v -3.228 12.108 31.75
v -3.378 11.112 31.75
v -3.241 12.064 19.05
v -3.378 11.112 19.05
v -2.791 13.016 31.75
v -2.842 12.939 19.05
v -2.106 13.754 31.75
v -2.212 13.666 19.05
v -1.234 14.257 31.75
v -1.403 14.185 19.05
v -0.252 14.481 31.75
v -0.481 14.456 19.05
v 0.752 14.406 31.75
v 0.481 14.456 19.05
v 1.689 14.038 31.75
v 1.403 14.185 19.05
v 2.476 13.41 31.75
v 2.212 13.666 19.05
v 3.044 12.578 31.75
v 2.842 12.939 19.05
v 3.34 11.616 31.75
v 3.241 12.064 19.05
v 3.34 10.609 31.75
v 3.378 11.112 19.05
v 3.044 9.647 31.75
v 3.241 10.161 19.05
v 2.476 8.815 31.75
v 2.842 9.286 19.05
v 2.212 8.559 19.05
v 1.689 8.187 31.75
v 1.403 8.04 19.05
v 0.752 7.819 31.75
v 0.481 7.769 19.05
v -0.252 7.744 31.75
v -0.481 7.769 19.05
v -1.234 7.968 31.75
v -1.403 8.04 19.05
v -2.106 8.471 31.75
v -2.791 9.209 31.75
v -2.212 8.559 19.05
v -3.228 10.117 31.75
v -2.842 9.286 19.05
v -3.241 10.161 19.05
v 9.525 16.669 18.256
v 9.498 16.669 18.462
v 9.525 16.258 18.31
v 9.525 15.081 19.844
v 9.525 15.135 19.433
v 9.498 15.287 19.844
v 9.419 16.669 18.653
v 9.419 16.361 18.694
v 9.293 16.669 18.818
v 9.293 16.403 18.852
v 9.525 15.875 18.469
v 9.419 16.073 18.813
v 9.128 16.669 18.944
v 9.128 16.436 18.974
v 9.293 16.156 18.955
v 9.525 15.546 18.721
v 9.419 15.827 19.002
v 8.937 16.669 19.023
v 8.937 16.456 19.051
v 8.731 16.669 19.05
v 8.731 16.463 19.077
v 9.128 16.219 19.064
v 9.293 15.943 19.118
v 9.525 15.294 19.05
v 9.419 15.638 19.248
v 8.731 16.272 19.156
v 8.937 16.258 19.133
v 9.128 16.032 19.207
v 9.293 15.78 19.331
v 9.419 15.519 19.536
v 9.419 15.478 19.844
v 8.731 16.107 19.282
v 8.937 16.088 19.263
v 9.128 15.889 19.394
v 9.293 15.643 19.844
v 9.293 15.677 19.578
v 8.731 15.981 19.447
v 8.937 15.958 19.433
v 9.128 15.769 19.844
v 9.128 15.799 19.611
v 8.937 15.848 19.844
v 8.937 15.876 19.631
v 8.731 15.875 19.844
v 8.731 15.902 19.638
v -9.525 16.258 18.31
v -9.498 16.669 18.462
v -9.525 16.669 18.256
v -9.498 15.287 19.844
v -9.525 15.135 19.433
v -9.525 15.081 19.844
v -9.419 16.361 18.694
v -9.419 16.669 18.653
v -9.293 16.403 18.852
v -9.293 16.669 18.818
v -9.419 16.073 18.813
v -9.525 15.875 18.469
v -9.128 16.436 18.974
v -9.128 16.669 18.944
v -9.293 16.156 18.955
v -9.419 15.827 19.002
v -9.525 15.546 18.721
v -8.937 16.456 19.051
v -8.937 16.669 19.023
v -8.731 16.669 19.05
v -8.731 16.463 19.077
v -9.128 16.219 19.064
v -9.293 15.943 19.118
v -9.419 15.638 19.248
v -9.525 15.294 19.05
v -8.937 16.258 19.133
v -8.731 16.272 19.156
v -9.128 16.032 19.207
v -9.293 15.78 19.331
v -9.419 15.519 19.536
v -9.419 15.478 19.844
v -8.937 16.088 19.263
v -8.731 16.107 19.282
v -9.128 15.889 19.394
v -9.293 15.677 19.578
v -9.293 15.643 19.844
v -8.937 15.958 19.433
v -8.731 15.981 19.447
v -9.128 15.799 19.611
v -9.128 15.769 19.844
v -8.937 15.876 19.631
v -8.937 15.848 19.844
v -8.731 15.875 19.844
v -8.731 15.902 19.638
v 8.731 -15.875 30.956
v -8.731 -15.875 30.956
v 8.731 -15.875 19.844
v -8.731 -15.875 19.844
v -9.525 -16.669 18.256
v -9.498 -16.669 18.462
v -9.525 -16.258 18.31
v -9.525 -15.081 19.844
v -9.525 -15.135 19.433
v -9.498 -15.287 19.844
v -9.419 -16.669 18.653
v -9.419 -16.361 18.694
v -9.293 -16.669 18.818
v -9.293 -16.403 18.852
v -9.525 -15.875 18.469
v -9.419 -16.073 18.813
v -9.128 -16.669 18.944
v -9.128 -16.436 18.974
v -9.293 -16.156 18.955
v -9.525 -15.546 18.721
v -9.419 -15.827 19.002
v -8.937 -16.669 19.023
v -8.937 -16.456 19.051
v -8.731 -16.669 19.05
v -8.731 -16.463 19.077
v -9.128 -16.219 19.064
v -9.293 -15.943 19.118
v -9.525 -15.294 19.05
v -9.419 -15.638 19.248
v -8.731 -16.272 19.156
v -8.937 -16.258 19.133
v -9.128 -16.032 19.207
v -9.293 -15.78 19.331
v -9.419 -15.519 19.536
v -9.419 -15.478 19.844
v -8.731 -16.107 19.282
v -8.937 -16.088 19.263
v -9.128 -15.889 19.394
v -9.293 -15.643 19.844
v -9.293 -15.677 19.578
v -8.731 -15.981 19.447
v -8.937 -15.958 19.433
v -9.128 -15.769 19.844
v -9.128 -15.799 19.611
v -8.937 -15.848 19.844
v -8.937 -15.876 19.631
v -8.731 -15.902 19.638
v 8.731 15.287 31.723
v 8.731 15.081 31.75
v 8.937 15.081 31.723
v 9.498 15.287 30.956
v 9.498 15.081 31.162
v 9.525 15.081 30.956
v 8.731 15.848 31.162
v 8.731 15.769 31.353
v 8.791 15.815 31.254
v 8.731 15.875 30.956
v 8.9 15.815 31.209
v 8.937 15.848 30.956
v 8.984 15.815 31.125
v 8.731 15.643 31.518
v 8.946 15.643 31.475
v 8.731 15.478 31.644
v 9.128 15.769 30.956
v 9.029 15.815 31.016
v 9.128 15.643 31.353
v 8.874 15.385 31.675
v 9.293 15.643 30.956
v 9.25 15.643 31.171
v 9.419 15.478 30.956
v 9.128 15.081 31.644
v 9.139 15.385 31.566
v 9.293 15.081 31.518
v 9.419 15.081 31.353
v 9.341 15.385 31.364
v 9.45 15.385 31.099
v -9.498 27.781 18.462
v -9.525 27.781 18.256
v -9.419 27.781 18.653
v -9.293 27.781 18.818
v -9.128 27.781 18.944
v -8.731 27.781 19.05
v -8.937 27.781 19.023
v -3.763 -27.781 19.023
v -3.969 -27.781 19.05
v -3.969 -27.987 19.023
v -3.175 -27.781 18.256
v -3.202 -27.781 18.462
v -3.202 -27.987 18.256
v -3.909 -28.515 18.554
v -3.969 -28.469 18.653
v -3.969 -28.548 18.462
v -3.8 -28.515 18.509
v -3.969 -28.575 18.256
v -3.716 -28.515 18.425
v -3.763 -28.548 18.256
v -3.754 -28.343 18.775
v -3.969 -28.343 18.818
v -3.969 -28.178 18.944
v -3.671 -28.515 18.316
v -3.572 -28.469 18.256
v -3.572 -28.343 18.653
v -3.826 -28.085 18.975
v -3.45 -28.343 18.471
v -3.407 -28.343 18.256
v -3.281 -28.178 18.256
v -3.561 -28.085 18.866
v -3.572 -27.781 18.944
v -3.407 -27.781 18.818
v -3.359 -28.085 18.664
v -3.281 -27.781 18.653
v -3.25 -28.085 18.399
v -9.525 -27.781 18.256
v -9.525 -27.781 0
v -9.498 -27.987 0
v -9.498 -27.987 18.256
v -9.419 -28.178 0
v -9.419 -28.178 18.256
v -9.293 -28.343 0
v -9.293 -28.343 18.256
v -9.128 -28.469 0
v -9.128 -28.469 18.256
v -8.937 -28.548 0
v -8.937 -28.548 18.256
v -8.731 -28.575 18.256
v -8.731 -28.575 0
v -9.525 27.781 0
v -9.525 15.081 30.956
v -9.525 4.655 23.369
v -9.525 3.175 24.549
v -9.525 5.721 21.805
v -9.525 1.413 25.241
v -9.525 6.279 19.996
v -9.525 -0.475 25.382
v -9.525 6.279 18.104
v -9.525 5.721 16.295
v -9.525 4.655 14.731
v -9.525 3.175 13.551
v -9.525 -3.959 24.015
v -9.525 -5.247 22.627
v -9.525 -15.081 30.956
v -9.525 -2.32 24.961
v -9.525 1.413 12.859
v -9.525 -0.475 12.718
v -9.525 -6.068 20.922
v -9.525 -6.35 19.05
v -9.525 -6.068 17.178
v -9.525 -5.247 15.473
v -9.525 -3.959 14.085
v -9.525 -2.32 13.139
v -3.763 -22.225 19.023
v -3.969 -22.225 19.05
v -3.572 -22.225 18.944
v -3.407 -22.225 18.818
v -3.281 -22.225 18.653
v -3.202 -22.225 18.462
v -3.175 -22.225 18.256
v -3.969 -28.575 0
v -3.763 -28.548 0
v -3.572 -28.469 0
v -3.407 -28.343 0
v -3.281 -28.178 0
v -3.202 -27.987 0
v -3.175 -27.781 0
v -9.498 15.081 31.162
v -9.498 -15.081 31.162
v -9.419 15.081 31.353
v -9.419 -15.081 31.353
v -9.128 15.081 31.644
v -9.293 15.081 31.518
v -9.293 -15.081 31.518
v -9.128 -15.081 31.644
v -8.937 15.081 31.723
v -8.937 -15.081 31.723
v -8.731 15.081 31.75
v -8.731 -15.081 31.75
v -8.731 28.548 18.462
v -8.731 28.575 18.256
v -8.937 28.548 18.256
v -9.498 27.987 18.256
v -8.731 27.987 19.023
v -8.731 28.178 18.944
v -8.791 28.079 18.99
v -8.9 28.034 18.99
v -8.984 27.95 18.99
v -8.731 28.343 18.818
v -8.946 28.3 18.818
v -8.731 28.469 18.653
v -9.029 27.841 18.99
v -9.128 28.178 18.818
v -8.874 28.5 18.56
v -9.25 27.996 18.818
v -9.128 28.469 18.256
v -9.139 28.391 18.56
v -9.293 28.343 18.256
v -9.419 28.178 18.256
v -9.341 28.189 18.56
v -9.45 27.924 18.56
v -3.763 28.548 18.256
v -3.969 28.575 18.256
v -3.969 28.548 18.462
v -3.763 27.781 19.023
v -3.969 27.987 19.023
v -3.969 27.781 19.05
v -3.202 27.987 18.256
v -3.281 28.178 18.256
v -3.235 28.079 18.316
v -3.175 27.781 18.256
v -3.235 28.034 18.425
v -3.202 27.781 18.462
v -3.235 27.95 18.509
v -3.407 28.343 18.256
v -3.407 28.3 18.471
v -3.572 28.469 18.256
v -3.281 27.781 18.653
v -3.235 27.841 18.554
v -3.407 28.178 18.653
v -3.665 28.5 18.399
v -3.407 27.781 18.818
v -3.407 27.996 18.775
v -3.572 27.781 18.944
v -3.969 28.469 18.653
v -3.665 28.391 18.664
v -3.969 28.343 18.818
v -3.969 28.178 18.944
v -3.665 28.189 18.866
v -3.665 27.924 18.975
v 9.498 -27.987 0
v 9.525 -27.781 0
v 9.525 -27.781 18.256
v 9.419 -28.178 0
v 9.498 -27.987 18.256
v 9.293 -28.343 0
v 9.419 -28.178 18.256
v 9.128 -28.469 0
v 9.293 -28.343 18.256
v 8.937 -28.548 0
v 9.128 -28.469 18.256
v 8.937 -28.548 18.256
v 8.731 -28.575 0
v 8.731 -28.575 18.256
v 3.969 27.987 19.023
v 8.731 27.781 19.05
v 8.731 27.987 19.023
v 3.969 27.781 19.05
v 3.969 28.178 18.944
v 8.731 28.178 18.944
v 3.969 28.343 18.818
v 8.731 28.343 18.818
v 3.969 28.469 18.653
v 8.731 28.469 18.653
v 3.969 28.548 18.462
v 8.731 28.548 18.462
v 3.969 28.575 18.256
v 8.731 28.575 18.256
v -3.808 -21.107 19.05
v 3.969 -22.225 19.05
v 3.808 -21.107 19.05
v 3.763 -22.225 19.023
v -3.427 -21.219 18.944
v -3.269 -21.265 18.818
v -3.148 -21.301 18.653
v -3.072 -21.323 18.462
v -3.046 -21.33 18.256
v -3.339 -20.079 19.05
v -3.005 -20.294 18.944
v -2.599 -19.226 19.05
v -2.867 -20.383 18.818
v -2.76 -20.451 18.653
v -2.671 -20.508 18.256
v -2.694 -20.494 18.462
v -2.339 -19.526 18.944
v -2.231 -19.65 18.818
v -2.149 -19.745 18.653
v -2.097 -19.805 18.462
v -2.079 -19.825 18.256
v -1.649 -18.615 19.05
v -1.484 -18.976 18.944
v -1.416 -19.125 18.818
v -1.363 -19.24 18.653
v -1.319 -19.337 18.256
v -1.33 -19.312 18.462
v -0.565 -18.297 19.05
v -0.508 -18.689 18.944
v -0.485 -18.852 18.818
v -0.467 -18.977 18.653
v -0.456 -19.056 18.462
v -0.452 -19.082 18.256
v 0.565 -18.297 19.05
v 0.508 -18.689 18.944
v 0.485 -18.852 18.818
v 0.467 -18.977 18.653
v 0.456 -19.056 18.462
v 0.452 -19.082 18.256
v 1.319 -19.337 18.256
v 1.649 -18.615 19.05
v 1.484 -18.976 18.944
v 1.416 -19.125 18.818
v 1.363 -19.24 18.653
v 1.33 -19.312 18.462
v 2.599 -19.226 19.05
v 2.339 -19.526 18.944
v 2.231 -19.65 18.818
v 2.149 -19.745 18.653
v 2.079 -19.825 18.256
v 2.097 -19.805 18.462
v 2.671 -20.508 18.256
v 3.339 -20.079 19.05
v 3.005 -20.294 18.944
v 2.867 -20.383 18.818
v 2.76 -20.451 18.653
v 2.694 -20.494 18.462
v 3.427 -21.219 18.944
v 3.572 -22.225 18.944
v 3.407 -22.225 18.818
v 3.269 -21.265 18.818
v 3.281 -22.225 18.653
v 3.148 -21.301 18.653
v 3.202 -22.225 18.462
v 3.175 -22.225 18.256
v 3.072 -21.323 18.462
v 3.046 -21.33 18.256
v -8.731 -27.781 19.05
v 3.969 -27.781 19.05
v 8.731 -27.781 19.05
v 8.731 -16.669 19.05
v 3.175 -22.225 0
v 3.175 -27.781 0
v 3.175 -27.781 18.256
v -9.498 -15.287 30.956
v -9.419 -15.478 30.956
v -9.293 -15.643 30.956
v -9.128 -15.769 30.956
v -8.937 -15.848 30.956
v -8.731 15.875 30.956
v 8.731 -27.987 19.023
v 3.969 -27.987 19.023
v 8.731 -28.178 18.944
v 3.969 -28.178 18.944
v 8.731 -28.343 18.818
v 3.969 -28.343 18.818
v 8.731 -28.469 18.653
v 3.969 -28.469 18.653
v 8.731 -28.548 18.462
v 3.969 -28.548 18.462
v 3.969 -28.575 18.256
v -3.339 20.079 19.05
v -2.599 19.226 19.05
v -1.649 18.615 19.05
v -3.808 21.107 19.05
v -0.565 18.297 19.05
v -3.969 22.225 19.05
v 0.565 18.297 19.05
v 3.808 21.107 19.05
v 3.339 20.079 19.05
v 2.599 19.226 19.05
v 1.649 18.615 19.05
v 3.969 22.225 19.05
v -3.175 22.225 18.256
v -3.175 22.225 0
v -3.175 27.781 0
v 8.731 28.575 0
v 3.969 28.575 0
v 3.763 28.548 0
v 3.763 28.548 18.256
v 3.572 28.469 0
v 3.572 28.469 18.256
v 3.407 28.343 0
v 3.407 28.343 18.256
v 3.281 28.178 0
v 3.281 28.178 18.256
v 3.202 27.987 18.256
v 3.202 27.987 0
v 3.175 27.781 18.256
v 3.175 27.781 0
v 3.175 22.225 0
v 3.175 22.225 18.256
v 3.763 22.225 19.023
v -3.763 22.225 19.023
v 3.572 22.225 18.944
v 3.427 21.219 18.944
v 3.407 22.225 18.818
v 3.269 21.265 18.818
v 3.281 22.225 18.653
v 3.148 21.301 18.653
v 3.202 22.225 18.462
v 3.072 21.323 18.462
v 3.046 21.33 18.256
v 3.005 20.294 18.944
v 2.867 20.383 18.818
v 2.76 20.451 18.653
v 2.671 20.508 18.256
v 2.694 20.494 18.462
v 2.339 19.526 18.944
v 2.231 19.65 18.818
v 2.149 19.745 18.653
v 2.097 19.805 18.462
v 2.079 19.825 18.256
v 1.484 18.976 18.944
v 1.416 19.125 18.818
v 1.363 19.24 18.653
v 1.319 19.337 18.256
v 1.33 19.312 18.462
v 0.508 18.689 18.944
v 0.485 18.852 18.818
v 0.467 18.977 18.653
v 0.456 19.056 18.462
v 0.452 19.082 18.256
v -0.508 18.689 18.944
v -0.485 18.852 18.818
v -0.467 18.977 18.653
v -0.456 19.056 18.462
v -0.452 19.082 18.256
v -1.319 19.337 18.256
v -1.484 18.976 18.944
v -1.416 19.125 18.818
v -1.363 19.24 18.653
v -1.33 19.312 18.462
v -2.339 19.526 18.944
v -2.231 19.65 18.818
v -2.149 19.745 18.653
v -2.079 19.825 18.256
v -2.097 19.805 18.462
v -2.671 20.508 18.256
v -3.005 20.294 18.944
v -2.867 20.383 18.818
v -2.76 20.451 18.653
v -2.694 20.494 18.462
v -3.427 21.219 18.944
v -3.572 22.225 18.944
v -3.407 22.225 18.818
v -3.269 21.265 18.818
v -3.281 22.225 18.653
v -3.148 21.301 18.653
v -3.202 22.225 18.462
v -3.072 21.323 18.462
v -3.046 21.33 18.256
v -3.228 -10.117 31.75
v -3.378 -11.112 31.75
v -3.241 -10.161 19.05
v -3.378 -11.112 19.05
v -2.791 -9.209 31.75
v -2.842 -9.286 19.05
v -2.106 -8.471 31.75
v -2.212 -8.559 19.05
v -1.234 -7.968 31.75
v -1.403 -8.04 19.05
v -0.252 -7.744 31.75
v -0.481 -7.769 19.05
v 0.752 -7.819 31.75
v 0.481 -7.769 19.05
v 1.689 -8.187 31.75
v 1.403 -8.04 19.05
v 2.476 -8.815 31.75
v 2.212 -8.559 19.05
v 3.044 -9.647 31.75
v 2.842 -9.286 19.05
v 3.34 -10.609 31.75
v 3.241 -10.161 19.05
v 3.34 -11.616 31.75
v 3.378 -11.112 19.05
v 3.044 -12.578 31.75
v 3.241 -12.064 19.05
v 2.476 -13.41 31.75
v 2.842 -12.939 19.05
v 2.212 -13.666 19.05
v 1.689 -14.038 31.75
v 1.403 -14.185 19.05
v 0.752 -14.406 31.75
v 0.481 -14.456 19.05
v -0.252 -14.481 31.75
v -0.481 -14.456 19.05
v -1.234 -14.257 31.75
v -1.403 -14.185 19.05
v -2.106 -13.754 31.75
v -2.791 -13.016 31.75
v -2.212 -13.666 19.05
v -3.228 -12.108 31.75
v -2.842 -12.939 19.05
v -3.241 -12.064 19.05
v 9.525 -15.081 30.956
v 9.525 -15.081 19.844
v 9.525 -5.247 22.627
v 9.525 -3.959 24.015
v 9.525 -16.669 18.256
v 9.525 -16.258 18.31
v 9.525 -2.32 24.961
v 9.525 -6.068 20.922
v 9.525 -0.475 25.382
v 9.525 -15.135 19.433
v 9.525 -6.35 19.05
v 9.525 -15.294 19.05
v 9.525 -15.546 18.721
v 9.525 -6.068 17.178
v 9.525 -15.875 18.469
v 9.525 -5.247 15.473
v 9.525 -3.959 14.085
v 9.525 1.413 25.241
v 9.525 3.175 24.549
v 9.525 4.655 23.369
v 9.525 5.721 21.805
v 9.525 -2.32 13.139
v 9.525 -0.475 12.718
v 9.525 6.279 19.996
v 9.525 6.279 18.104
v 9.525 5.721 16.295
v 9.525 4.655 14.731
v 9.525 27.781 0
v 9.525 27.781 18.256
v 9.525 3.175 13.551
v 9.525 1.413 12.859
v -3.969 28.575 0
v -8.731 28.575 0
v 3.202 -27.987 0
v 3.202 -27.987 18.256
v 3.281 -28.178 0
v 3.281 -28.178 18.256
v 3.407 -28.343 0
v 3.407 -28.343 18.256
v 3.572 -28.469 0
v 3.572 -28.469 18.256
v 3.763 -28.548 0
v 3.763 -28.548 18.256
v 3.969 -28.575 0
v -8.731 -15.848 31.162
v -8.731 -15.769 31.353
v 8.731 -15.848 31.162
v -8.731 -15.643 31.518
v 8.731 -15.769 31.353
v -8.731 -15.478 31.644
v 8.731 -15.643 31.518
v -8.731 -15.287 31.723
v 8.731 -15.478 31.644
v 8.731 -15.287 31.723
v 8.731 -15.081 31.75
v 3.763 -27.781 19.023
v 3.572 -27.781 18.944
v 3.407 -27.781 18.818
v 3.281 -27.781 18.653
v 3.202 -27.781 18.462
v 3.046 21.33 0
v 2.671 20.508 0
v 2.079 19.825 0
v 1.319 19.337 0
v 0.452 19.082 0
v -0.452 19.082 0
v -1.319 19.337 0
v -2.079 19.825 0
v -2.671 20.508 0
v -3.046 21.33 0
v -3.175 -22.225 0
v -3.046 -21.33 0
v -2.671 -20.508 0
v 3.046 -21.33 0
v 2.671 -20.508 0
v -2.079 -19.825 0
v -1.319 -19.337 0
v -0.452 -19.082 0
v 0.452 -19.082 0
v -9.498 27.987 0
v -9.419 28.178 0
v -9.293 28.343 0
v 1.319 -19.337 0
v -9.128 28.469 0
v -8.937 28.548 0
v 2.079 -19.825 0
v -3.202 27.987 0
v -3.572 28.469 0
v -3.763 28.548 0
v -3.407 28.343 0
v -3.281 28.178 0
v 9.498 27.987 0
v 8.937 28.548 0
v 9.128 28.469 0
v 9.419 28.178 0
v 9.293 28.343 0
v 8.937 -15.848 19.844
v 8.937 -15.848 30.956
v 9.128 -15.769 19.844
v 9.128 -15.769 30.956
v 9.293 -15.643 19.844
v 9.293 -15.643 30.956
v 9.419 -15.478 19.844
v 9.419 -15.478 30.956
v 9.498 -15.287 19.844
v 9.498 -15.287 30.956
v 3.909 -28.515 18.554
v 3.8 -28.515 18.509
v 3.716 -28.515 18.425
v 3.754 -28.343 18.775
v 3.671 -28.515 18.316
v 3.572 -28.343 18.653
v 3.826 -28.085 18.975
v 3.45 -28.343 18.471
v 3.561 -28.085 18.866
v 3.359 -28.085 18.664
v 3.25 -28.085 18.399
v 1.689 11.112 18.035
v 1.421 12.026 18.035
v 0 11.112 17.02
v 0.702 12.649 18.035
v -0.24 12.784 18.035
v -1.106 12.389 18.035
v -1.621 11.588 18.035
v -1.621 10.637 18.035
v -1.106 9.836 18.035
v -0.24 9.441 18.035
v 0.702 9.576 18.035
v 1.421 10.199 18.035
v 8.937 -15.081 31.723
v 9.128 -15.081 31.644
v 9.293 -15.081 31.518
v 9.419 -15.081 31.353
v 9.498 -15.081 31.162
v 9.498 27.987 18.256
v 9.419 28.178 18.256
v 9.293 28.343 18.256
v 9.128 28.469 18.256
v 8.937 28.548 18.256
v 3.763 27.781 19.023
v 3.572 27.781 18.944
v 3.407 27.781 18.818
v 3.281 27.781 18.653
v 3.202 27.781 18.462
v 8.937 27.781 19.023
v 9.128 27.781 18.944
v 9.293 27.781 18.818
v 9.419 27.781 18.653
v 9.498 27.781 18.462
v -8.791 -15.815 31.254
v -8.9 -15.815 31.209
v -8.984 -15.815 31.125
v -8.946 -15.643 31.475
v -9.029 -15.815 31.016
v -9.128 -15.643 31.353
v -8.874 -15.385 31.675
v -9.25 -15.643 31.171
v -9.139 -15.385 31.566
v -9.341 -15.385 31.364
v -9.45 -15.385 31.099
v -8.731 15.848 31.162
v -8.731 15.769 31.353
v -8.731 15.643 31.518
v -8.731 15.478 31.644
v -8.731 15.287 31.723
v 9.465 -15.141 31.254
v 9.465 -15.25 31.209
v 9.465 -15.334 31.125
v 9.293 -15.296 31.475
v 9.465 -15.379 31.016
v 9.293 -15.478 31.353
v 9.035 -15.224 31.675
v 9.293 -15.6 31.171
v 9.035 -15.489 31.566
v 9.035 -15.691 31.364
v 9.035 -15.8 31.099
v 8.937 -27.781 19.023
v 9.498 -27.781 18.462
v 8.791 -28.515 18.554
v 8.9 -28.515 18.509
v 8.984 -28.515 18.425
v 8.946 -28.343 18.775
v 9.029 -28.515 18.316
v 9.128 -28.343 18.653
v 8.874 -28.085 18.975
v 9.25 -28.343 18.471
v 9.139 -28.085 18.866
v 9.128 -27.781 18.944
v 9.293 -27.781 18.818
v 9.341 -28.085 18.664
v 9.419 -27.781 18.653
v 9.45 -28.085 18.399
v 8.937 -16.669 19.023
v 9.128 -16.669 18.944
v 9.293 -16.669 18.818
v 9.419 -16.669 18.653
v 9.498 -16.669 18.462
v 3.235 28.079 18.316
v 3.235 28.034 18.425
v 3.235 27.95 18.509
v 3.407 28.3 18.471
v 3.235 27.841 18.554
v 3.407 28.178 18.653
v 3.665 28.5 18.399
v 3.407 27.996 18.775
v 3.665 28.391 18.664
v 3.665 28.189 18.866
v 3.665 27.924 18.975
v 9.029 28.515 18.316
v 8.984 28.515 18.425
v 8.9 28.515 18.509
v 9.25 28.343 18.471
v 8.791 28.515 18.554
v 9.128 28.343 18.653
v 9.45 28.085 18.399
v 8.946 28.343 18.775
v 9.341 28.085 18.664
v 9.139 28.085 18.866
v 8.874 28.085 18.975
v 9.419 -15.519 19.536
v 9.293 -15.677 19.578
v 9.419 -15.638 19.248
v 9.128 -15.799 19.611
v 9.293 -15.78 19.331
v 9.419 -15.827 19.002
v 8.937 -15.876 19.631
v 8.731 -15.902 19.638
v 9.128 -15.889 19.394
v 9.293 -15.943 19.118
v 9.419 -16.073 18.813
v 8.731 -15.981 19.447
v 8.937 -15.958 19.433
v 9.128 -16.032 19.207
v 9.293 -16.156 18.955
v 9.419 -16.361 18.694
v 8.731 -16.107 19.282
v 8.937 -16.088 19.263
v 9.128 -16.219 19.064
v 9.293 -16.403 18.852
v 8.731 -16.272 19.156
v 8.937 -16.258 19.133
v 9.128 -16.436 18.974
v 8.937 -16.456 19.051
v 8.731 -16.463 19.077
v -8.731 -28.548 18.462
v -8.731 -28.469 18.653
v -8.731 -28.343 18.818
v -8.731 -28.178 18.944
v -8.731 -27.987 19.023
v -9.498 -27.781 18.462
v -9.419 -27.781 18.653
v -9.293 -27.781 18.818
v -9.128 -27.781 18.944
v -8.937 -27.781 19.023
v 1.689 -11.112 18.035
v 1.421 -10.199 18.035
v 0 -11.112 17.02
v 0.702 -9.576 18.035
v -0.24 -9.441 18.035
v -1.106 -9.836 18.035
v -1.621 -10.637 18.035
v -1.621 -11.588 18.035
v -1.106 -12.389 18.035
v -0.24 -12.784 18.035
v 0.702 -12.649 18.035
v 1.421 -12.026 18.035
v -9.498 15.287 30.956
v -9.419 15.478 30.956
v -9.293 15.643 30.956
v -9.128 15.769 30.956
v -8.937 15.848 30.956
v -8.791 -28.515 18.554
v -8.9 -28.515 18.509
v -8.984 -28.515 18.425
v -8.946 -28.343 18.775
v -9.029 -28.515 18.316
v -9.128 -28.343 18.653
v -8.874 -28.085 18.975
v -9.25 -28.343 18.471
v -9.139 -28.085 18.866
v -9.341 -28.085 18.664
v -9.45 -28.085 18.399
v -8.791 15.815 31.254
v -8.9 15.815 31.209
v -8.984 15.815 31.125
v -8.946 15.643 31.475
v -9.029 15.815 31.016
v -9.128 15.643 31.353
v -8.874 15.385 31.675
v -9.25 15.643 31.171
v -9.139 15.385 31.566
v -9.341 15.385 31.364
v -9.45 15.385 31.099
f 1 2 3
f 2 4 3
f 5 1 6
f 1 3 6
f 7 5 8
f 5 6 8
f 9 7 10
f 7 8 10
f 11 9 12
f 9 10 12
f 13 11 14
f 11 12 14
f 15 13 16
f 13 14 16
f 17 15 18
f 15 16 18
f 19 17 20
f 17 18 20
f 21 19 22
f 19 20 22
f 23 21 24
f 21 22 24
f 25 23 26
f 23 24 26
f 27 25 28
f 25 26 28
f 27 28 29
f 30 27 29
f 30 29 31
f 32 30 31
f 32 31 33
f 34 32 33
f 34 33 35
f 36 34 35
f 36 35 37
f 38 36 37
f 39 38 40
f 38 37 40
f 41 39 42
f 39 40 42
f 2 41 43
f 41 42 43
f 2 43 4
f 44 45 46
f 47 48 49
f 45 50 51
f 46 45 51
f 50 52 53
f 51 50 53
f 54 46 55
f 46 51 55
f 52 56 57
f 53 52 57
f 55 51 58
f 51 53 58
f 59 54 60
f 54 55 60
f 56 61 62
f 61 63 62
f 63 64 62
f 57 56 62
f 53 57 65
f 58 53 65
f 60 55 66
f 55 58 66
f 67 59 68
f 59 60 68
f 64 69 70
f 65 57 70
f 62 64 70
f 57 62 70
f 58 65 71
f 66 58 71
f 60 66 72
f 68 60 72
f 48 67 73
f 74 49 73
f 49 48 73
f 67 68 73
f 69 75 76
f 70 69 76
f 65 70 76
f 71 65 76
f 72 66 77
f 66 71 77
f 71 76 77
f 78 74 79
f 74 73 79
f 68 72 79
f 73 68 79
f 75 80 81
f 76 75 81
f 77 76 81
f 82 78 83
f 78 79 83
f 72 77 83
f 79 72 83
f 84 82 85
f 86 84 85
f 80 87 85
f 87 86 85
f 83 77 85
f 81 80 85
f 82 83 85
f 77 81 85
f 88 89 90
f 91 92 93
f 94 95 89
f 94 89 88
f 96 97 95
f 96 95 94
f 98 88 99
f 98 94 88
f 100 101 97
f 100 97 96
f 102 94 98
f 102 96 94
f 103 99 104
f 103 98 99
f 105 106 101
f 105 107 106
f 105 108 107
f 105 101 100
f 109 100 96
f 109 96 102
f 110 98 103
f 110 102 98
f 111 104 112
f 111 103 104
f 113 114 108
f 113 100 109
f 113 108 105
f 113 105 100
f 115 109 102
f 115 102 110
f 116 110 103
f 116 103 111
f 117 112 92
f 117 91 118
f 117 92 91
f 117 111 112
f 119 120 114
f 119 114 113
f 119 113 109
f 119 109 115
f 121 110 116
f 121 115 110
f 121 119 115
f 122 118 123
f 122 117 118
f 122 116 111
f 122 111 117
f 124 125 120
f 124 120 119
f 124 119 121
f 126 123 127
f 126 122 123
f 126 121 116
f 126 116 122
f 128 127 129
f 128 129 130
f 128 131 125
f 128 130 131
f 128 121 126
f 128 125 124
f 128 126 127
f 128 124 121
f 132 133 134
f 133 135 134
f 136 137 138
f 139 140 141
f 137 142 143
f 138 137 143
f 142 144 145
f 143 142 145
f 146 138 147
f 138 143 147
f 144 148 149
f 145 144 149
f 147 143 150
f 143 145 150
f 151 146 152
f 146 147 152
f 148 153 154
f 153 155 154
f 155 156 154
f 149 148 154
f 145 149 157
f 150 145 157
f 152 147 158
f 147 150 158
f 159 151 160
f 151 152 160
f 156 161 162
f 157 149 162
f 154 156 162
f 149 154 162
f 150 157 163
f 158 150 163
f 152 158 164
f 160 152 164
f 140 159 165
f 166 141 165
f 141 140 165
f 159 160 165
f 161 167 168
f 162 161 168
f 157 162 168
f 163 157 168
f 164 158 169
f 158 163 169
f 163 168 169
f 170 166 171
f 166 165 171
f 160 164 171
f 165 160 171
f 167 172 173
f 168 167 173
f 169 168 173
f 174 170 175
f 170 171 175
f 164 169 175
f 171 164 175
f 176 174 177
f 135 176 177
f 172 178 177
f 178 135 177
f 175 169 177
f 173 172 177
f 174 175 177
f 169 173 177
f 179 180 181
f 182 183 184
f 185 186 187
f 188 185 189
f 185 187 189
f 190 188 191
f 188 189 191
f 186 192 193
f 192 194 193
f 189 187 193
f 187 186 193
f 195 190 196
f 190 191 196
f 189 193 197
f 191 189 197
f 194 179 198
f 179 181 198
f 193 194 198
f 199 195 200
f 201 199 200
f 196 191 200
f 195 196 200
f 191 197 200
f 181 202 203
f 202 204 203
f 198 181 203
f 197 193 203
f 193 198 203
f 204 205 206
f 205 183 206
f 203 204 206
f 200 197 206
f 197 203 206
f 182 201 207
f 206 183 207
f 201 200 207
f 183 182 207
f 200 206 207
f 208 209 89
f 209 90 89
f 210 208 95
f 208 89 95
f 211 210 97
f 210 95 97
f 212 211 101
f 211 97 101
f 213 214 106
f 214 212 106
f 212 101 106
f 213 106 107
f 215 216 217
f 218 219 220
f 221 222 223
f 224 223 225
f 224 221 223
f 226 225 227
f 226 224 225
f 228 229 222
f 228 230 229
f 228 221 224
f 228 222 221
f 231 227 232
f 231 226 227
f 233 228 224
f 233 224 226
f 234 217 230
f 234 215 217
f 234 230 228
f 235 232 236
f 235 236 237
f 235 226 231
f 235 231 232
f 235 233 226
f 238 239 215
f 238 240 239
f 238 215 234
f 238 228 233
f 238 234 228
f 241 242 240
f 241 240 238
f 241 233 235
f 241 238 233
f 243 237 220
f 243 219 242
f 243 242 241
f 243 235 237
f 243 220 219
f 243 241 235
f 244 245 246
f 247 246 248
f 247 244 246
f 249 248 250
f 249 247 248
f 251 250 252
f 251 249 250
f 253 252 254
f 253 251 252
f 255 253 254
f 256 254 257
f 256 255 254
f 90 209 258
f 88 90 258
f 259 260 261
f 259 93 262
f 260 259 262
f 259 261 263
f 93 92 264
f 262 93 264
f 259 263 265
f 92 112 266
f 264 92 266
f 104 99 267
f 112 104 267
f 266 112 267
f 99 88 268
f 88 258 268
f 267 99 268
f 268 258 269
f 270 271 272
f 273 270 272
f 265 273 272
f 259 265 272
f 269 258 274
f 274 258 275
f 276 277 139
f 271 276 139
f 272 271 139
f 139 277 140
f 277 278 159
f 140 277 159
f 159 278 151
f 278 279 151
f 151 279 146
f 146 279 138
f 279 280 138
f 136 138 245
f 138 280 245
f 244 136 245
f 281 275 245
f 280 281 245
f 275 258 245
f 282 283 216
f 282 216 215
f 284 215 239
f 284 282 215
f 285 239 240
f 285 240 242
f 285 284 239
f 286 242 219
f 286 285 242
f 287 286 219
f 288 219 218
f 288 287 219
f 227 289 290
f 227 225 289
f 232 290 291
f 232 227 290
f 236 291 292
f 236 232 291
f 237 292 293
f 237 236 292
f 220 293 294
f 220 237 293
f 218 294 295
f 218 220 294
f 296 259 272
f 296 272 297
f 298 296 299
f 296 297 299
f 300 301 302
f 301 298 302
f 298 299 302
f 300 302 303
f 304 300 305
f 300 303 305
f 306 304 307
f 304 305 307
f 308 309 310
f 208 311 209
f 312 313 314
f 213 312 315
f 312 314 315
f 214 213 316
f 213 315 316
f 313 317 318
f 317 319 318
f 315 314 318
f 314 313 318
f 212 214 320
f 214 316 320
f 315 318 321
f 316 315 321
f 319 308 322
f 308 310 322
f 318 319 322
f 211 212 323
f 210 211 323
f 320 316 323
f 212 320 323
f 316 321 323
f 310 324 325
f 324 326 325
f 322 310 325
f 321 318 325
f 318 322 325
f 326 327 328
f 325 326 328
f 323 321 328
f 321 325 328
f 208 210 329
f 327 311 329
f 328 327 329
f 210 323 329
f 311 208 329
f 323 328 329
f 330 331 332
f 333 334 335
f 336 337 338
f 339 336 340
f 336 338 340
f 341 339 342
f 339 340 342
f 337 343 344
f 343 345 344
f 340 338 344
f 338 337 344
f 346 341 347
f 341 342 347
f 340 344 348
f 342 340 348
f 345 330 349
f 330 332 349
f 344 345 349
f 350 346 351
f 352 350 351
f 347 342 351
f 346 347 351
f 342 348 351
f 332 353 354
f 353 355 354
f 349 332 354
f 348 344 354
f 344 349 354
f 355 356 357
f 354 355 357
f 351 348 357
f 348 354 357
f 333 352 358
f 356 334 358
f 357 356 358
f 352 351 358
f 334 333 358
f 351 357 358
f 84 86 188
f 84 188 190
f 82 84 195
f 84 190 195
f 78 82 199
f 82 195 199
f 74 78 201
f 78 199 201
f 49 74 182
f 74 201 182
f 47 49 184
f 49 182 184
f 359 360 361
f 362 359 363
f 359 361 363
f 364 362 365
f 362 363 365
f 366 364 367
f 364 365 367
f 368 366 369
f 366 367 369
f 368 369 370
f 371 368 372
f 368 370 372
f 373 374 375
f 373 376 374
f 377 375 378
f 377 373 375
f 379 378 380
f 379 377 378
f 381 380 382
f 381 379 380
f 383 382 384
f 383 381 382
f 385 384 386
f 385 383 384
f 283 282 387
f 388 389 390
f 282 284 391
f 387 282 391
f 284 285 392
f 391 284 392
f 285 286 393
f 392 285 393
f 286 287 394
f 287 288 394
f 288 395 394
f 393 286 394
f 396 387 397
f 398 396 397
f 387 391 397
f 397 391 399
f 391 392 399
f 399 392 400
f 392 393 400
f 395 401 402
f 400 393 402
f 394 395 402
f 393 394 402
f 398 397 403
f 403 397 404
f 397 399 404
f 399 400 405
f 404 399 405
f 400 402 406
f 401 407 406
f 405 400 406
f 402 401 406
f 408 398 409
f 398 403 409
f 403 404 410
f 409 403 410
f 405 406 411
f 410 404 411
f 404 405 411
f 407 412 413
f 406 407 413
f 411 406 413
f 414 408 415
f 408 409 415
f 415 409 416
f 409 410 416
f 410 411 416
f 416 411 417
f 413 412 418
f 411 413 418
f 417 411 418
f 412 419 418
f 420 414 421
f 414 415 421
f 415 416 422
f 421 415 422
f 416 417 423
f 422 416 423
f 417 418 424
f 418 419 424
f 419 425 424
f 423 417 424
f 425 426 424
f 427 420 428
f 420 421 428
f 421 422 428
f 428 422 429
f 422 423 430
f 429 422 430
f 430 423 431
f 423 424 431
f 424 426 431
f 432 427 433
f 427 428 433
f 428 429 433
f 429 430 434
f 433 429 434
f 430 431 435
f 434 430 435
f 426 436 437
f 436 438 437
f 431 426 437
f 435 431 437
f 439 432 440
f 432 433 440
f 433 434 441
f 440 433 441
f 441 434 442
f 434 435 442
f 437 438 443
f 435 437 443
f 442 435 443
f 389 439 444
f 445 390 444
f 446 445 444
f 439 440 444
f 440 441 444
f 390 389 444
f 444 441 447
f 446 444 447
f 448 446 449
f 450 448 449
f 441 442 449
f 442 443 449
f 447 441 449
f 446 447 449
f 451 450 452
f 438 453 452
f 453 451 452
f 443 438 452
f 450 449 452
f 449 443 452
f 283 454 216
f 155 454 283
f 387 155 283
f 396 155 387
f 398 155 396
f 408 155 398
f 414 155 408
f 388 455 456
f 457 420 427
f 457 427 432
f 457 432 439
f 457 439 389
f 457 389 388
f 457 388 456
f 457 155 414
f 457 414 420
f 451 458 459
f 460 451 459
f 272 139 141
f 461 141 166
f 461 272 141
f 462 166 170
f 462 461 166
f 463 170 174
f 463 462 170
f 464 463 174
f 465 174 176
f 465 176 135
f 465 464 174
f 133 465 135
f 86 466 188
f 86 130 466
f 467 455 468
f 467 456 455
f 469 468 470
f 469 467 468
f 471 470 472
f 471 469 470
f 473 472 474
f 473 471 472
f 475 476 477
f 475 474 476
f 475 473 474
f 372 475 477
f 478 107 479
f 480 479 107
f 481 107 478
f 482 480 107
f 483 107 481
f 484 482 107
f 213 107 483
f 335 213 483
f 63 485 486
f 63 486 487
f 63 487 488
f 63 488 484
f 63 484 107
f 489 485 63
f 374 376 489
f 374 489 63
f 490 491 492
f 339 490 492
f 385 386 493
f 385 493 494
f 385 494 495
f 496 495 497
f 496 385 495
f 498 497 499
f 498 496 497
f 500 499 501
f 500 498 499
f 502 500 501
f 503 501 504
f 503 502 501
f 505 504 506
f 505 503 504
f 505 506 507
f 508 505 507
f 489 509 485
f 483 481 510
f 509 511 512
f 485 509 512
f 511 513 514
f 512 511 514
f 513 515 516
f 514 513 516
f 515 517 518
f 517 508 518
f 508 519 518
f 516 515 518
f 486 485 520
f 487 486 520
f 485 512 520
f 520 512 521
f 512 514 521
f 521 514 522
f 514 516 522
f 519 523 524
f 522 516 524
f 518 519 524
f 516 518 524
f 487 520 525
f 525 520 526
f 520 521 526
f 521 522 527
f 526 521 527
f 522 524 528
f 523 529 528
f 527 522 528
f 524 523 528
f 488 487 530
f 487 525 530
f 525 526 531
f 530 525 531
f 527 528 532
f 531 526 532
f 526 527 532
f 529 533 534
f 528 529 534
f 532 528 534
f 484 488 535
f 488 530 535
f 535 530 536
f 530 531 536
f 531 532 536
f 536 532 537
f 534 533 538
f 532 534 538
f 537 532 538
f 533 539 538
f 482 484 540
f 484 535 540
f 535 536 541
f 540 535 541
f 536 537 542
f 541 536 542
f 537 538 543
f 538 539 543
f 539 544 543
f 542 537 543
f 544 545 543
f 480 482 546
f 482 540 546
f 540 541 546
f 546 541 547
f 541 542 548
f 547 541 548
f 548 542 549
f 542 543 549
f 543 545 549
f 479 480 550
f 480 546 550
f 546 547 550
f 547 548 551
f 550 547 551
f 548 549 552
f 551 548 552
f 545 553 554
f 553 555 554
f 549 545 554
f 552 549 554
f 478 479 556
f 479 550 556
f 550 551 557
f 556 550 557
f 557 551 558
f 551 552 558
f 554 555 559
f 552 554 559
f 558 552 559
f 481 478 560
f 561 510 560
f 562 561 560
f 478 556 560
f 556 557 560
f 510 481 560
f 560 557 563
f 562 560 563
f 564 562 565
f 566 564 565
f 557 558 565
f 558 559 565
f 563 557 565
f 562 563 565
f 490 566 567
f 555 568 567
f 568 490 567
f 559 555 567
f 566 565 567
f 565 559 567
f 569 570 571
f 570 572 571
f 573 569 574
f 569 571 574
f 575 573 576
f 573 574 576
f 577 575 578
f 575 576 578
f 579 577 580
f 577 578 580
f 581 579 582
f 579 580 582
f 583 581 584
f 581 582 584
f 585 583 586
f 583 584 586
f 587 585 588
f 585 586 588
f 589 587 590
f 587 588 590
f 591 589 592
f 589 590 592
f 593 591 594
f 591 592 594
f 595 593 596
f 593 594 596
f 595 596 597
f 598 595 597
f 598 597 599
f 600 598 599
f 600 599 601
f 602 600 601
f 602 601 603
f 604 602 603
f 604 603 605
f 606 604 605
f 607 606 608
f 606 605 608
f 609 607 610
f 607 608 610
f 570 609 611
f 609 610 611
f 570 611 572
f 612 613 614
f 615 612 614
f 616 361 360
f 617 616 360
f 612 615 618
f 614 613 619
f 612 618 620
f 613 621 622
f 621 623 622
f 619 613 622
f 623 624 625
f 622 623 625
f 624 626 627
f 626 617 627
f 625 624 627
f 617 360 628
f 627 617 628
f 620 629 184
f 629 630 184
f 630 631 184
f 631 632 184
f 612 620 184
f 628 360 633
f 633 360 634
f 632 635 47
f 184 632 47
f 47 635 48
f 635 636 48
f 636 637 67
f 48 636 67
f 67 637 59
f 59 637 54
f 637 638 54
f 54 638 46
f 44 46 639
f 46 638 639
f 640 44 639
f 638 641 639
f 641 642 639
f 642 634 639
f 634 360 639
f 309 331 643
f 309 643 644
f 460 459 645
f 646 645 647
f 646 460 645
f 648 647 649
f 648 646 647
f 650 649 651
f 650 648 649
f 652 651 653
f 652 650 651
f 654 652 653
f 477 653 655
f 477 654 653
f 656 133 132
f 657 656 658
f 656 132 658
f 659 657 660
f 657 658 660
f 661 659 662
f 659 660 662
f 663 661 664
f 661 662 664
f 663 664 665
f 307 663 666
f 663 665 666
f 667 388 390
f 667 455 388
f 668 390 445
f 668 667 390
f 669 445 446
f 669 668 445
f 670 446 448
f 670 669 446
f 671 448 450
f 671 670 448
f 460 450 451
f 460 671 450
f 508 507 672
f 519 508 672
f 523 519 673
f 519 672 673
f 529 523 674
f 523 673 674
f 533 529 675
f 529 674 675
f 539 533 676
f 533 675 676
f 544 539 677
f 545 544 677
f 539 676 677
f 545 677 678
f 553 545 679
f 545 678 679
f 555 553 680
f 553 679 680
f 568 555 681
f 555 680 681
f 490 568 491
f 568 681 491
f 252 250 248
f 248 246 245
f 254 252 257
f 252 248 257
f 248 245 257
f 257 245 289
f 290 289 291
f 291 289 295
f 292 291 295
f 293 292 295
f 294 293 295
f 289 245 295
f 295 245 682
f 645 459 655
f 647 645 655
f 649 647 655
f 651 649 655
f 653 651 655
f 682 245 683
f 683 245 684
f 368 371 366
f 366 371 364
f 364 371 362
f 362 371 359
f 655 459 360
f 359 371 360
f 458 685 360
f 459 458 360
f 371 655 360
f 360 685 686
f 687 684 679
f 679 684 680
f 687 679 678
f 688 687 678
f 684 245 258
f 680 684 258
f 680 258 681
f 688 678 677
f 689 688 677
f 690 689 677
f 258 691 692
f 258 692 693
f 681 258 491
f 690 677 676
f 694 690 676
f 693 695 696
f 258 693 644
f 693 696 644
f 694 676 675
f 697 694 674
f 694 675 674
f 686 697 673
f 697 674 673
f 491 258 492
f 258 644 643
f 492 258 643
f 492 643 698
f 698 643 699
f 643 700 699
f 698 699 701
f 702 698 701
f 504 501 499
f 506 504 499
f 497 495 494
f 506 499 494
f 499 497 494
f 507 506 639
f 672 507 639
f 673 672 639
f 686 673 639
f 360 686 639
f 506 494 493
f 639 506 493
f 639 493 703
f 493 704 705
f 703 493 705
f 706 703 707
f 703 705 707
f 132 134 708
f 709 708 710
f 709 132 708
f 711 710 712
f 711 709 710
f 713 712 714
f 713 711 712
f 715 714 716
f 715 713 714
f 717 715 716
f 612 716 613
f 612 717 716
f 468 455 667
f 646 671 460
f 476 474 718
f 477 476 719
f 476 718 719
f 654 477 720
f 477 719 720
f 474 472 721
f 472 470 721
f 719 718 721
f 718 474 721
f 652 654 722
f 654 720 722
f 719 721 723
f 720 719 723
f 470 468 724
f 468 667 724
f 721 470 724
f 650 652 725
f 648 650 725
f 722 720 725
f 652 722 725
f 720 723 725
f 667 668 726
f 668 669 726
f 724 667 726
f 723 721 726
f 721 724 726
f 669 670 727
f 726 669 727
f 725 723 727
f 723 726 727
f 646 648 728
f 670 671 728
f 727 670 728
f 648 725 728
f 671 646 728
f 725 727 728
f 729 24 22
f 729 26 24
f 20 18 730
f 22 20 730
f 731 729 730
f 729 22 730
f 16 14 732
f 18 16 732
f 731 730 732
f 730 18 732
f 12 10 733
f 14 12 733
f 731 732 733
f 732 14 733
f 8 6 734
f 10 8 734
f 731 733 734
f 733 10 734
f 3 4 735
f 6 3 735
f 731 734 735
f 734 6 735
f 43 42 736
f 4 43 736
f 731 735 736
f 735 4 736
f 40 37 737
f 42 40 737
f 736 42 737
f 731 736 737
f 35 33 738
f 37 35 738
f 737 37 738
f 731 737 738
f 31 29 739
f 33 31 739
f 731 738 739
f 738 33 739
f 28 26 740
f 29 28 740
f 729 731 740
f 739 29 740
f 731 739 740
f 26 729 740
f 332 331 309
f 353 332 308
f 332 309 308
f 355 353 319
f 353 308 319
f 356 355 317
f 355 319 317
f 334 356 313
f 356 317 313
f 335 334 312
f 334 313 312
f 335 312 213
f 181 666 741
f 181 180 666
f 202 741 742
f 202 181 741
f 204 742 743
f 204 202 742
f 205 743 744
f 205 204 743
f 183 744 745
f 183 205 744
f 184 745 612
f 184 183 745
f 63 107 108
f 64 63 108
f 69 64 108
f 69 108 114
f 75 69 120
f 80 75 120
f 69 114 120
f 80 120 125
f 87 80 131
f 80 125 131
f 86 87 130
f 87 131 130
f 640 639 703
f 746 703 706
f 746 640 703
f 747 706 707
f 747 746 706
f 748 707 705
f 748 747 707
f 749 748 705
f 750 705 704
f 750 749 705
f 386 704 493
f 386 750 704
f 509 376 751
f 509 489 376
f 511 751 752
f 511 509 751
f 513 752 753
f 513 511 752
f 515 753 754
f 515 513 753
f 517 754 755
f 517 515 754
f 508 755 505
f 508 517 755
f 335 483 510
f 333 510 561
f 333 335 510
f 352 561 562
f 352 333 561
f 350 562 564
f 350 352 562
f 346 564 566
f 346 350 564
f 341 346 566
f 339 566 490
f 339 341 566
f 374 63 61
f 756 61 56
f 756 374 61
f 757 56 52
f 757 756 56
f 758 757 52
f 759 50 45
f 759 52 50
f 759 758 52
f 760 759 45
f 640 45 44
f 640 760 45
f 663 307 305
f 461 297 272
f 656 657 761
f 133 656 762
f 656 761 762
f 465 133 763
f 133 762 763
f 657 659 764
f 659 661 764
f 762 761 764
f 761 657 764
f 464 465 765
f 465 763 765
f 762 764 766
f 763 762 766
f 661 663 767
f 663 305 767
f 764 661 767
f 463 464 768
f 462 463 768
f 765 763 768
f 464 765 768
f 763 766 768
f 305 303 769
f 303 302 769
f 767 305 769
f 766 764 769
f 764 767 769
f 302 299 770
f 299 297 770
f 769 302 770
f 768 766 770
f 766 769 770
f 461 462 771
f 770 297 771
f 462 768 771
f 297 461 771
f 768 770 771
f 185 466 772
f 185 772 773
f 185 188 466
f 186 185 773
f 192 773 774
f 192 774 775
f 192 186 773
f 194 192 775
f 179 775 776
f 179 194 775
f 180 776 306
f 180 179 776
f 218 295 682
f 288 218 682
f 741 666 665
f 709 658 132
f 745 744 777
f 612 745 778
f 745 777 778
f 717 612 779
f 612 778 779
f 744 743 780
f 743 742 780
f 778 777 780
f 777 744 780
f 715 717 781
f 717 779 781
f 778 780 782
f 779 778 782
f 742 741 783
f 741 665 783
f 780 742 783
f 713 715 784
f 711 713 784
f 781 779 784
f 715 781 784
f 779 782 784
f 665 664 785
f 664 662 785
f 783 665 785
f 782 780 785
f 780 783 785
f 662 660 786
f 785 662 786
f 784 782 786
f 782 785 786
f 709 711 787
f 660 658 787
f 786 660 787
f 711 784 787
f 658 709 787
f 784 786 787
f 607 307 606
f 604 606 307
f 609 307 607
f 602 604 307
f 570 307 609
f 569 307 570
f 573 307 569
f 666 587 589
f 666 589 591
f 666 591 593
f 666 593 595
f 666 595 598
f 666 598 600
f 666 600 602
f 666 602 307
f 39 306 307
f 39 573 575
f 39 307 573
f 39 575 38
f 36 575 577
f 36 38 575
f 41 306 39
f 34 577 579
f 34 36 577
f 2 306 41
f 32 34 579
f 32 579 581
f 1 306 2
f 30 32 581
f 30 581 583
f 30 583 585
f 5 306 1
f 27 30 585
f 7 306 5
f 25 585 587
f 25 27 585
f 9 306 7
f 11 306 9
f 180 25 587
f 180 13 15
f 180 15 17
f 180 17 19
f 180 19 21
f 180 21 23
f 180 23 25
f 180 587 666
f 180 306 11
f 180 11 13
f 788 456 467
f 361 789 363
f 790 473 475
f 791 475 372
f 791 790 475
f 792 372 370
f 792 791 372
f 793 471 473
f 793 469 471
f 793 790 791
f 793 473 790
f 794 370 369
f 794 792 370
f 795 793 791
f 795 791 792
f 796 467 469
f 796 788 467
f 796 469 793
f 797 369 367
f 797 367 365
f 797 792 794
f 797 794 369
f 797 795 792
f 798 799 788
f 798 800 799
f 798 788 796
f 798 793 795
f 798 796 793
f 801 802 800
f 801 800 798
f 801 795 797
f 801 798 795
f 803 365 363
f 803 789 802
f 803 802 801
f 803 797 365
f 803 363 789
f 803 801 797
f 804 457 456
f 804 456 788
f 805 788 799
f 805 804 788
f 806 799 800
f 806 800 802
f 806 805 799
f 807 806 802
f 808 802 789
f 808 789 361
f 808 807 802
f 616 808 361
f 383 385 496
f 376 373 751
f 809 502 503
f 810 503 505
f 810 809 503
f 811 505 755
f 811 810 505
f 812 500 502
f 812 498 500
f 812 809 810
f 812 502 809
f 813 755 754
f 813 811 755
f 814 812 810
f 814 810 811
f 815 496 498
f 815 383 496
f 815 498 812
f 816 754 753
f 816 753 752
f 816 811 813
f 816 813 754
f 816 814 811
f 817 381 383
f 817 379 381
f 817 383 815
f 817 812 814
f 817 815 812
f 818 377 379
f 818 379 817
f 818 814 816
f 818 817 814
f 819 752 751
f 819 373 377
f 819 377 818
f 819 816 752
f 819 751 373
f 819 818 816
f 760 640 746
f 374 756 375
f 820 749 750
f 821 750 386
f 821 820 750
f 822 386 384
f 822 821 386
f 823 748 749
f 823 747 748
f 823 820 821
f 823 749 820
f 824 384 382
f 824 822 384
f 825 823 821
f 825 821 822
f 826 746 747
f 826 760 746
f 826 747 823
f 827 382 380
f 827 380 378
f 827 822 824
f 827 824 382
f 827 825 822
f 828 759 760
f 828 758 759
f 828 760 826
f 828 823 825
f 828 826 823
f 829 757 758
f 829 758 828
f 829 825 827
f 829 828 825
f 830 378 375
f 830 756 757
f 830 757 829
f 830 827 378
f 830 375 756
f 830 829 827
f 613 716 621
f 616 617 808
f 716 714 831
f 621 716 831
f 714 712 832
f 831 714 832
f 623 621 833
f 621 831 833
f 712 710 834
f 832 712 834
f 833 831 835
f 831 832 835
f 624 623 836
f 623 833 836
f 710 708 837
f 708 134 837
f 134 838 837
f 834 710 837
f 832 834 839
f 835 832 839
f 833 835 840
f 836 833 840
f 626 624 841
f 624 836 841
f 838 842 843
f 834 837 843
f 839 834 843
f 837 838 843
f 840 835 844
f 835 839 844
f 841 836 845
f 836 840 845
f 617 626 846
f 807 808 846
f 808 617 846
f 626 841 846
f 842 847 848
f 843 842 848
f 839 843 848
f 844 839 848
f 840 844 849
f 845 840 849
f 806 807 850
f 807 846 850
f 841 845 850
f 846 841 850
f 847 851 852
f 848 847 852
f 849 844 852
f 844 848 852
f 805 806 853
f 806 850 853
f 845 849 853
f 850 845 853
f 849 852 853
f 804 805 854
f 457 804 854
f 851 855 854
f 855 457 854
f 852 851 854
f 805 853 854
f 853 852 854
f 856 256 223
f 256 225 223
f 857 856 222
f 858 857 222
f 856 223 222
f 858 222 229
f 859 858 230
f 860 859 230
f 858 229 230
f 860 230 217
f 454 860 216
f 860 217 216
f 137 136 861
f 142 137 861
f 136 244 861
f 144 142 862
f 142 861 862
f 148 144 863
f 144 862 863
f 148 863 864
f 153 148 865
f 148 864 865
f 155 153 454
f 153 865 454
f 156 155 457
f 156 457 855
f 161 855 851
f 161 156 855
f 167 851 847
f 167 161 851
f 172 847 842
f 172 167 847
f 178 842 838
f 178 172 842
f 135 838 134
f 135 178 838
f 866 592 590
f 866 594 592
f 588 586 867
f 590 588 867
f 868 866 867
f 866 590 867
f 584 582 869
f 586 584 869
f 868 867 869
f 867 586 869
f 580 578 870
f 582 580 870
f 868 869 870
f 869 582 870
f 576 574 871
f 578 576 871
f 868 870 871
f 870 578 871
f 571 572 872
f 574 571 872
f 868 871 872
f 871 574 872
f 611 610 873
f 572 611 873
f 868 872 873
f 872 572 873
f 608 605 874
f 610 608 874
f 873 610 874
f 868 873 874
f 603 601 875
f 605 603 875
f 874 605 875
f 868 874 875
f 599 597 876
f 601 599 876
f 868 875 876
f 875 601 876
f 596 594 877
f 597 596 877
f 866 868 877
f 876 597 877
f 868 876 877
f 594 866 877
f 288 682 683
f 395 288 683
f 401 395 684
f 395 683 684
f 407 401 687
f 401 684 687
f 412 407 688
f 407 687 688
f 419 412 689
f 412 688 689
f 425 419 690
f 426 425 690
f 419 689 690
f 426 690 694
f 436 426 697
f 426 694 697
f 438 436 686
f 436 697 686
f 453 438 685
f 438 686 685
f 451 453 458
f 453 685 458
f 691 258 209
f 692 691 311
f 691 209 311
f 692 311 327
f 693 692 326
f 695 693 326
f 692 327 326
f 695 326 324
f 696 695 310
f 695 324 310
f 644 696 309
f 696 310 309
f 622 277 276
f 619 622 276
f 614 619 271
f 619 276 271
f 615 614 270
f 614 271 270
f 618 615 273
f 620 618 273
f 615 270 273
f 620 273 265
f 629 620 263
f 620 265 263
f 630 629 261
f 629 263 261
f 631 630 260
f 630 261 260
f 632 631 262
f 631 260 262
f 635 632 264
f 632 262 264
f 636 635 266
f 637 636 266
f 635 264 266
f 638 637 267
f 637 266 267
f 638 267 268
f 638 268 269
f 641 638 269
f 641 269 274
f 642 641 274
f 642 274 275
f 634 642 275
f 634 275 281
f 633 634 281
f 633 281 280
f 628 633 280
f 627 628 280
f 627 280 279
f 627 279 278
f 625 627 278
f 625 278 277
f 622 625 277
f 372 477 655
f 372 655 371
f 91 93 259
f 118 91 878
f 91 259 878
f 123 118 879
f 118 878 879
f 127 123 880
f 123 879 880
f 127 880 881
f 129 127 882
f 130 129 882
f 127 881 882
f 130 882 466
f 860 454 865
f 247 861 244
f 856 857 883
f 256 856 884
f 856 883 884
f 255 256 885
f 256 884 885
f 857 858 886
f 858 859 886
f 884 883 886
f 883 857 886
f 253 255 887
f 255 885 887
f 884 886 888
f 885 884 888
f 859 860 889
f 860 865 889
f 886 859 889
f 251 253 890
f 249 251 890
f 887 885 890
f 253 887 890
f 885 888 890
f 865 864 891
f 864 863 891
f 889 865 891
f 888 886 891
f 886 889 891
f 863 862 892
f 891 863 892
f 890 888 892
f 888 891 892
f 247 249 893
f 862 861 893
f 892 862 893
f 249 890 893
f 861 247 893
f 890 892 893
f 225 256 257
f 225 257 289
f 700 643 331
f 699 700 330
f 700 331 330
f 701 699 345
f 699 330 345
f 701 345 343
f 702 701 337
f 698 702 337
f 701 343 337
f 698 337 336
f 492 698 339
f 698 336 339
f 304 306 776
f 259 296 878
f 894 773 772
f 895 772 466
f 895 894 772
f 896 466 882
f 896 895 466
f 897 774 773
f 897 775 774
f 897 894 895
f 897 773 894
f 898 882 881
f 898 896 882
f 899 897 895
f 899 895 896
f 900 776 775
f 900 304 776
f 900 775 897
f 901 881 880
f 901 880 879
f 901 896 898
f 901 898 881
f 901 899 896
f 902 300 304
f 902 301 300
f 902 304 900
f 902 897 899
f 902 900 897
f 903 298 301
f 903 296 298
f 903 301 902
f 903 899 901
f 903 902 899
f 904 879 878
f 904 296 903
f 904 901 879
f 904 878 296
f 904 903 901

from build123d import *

# Parameters (mm, degrees)
F0_W     = 19.05
F0_H     = 6.35
F0_H_2   = 15.875
F0_R     = 3.571875
F0_H_3   = 9.525
F1_DEPTH = 19.05
F2_DEPTH = 31.75
F4_D     = 12.7
F6_D     = 6.7564
F6_DEPTH = 12.7
F6_TIP   = 2.0298273432
F7_R     = 0.79375


with BuildPart() as f1:
    # F0 (on Top) → F1 (new body)
    with BuildSketch(Plane.XY):
        with Locations((0, 3.175)):
            Rectangle(F0_W, F0_H)
        with BuildLine():
            Line((9.525, -28.575), (9.525, -15.875))
            Line((9.525, -15.875), (-9.525, -15.875))
            Line((-9.525, -15.875), (-9.525, -28.575))
            Line((-9.525, -28.575), (-3.175, -28.575))
            Line((-3.175, -28.575), (-3.175, -22.225))
            ThreePointArc((-3.175, -22.225), (0, -19.05), (3.175, -22.225))
            Line((3.175, -22.225), (3.175, -28.575))
            Line((3.175, -28.575), (9.525, -28.575))
        make_face()
        with Locations((0, -7.9375)):
            Rectangle(F0_W, F0_H_2)
        with Locations((0, -11.1125)):
            Circle(F0_R, mode=Mode.SUBTRACT)
        with Locations((0, 11.1125)):
            Rectangle(F0_W, F0_H_3)
        with Locations((0, 11.1125)):
            Circle(F0_R, mode=Mode.SUBTRACT)
        with BuildLine():
            Line((9.525, 15.875), (9.525, 28.575))
            Line((9.525, 28.575), (3.175, 28.575))
            Line((3.175, 28.575), (3.175, 22.225))
            ThreePointArc((3.175, 22.225), (0, 19.05), (-3.175, 22.225))
            Line((-3.175, 22.225), (-3.175, 28.575))
            Line((-3.175, 28.575), (-9.525, 28.575))
            Line((-9.525, 28.575), (-9.525, 15.875))
            Line((-9.525, 15.875), (9.525, 15.875))
        make_face()
        with Locations((0, 11.1125)):
            Circle(F0_R)
        with Locations((0, -11.1125)):
            Circle(F0_R)
    extrude(amount=F1_DEPTH)

    # F0 (on Top) → F2 (join)
    with BuildSketch(Plane.XY):
        with Locations((0, 3.175)):
            Rectangle(F0_W, F0_H)
        with Locations((0, -7.9375)):
            Rectangle(F0_W, F0_H_2)
        with Locations((0, -11.1125)):
            Circle(F0_R, mode=Mode.SUBTRACT)
        with Locations((0, 11.1125)):
            Rectangle(F0_W, F0_H_3)
        with Locations((0, 11.1125)):
            Circle(F0_R, mode=Mode.SUBTRACT)
        with Locations((0, -11.1125)):
            Circle(F0_R)
        with Locations((0, 11.1125)):
            Circle(F0_R)
    extrude(amount=F2_DEPTH)

    # F4 (through all)
    with Locations(Plane.YZ.offset(9.525)):
        with Locations((0, 19.05)):
            Hole(F4_D / 2)

    # F6
    with Locations(Plane.XY.offset(31.75)):
        with Locations((0, 11.1125), (0, -11.1125)):
            Hole(F6_D / 2, depth=F6_DEPTH)
            with Locations((0, 0, -(F6_DEPTH + F6_TIP / 2))):  # 118° drill point
                Cone(0, F6_D / 2, F6_TIP, mode=Mode.SUBTRACT)

    # F7
    f7_edges = [f1.edges().sort_by_distance(p)[0] for p in [
        (-9.525, 0, 31.75),
        (0, -15.875, 31.75),
        (9.525, 0, 31.75),
        (0, 15.875, 31.75),
        (9.525, 15.875, 25.4),
        (-9.525, 15.875, 25.4),
        (0, 15.875, 19.05),
        (9.525, 22.225, 19.05),
        (9.525, 28.575, 9.525),
        (-9.525, 28.575, 9.525),
        (6.35, 28.575, 19.05),
        (-6.35, 28.575, 19.05),
        (3.175, 28.575, 9.525),
        (-3.175, 28.575, 9.525),
        (3.175, 25.4, 19.05),
        (0, -15.875, 19.05),
        (9.525, -15.875, 25.4),
        (9.525, -22.225, 19.05),
        (-9.525, -22.225, 19.05),
        (-9.525, -15.875, 25.4),
        (-3.175, -25.4, 19.05),
        (6.35, -28.575, 19.05),
        (-6.35, -28.575, 19.05),
        (9.525, -28.575, 9.525),
        (-9.525, -28.575, 9.525),
        (3.175, -28.575, 9.525),
        (-3.175, -28.575, 9.525),
        (-9.525, 22.225, 19.05),
        (3.175, -25.4, 19.05),
        (0, -19.05, 19.05),
        (-3.175, 25.4, 19.05),
        (0, 19.05, 19.05),
    ]]
    fillet(f7_edges, radius=F7_R)


solid = f1.part
